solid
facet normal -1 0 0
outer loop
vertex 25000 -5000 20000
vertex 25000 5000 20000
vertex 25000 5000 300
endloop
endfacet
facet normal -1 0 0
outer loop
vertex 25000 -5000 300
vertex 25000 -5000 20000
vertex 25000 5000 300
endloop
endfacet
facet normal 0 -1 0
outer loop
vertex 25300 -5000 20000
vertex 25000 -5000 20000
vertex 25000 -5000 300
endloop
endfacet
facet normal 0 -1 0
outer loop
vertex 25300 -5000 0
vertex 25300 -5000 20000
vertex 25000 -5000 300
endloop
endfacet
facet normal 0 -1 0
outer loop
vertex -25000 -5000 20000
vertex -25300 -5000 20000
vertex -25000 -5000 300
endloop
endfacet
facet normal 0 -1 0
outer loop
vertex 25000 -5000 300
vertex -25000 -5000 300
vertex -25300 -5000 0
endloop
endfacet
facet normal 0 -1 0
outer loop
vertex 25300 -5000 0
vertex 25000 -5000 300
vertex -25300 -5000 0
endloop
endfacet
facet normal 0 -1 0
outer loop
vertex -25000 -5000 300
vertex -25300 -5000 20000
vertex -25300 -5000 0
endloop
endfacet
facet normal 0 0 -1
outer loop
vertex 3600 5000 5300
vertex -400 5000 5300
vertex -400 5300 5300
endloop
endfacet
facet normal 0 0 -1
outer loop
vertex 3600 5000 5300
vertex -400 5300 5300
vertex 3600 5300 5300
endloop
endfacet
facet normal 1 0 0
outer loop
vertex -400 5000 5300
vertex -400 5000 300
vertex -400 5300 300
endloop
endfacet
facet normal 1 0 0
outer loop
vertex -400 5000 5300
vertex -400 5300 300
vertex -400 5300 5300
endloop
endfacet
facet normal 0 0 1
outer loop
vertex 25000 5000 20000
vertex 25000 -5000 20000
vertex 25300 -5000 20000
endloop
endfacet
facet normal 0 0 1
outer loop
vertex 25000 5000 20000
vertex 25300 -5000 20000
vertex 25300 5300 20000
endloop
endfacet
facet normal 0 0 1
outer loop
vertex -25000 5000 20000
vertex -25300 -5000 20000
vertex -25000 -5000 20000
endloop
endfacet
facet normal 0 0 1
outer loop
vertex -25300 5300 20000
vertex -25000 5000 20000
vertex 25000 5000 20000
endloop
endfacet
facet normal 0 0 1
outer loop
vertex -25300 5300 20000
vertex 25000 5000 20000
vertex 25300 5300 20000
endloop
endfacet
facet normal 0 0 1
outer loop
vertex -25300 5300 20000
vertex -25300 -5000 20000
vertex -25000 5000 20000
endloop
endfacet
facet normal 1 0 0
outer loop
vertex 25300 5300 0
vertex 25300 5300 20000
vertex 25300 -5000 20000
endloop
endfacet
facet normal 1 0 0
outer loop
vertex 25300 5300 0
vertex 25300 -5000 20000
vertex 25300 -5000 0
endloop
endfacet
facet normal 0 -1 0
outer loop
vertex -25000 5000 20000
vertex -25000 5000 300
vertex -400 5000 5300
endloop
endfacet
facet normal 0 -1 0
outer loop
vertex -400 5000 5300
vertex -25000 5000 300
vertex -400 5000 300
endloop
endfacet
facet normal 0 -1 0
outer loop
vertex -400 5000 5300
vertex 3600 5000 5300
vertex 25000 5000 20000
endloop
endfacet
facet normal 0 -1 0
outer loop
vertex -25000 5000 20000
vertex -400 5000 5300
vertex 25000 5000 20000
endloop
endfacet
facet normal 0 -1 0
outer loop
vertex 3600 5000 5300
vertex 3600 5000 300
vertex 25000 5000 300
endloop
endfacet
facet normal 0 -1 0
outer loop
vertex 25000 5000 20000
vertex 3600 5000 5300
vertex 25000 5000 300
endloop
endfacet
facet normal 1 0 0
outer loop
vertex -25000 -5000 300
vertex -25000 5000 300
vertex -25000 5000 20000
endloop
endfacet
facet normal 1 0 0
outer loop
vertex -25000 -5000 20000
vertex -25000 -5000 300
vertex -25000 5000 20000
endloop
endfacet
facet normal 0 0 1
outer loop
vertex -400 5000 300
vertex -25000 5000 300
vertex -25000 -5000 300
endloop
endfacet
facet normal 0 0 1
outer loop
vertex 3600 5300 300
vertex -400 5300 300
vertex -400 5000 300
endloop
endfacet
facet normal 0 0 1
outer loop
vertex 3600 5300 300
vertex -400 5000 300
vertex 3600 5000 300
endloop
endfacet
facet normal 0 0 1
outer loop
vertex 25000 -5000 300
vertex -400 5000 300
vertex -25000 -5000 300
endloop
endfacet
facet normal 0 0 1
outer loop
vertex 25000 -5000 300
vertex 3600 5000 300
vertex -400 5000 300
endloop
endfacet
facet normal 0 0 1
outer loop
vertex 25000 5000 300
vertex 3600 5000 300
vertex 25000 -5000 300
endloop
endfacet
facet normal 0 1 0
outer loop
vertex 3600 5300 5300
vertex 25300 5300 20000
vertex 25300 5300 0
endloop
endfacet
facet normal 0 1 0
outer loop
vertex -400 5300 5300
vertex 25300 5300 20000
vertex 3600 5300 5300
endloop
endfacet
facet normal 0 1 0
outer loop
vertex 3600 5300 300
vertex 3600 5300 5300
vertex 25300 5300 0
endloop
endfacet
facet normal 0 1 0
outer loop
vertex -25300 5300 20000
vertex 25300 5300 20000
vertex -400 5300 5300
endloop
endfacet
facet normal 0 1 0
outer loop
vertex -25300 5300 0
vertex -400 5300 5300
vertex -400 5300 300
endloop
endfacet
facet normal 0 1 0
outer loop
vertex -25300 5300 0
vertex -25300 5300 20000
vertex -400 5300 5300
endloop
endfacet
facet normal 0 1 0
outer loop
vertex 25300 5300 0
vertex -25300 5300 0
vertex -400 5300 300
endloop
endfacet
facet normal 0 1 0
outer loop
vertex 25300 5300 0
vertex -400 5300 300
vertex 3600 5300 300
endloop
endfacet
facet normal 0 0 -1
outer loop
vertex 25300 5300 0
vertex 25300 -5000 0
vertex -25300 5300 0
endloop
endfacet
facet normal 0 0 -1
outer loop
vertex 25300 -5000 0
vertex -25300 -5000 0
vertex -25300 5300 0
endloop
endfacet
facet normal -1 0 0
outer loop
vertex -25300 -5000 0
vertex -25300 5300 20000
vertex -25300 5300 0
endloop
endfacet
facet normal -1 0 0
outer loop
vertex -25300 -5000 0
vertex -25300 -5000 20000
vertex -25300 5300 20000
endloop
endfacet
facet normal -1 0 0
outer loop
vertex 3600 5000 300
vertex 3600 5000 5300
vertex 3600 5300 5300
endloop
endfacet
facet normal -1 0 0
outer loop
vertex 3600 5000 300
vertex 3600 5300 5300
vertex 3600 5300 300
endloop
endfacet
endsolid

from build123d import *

# Parameters (mm, degrees)
SKETCH_1_W          = 50000
SKETCH_1_H          = 10000
EXTRUDE_1_DEPTH     = 300
SKETCH_3_W          = 20000
SKETCH_3_H          = 10000
EXTRUDE_2_DEPTH     = 300
SKETCH_4_W          = 50300
SKETCH_4_H          = 20000
EXTRUDE_3_DEPTH     = 300
SKETCH_5_W          = 20000
SKETCH_5_H          = 10300
EXTRUDE_4_DEPTH     = 300
CUT_EXTRUDE_1_DEPTH = 300


with BuildPart() as part:
    # 草图1 → 凸台-拉伸1 (new body)
    with BuildSketch(Plane.XY):
        Rectangle(SKETCH_1_W, SKETCH_1_H)
    extrude(amount=EXTRUDE_1_DEPTH)

    # 草图3 → 凸台-拉伸2 (add)
    with BuildSketch(Plane.ZY.offset(25000)):
        with Locations((10000, 0)):
            Rectangle(SKETCH_3_W, SKETCH_3_H)
    extrude(amount=EXTRUDE_2_DEPTH)

    # 草图4 → 凸台-拉伸3 (add)
    with BuildSketch(Plane(origin=(0, 5000, 0), x_dir=(1, 0, 0), z_dir=(0, 1, 0))):
        with Locations((-150, -10000)):
            Rectangle(SKETCH_4_W, SKETCH_4_H)
    extrude(amount=EXTRUDE_3_DEPTH)

    # 草图5 → 凸台-拉伸4 (add)
    with BuildSketch(Plane(origin=(25000, 0, 0), x_dir=(0, 0, -1), z_dir=(1, 0, 0))):
        with Locations((-10000, 150)):
            Rectangle(SKETCH_5_W, SKETCH_5_H)
    extrude(amount=EXTRUDE_4_DEPTH)

    # 草图6 → 切除-拉伸1 (cut)
    with BuildSketch(Plane.XZ.offset(-5000)):
        Polygon((0, 300), (-400, 300), (-400, 5300), (3600, 5300), (3600, 300), align=None)
    extrude(amount=-CUT_EXTRUDE_1_DEPTH, mode=Mode.SUBTRACT)


solid = part.part
